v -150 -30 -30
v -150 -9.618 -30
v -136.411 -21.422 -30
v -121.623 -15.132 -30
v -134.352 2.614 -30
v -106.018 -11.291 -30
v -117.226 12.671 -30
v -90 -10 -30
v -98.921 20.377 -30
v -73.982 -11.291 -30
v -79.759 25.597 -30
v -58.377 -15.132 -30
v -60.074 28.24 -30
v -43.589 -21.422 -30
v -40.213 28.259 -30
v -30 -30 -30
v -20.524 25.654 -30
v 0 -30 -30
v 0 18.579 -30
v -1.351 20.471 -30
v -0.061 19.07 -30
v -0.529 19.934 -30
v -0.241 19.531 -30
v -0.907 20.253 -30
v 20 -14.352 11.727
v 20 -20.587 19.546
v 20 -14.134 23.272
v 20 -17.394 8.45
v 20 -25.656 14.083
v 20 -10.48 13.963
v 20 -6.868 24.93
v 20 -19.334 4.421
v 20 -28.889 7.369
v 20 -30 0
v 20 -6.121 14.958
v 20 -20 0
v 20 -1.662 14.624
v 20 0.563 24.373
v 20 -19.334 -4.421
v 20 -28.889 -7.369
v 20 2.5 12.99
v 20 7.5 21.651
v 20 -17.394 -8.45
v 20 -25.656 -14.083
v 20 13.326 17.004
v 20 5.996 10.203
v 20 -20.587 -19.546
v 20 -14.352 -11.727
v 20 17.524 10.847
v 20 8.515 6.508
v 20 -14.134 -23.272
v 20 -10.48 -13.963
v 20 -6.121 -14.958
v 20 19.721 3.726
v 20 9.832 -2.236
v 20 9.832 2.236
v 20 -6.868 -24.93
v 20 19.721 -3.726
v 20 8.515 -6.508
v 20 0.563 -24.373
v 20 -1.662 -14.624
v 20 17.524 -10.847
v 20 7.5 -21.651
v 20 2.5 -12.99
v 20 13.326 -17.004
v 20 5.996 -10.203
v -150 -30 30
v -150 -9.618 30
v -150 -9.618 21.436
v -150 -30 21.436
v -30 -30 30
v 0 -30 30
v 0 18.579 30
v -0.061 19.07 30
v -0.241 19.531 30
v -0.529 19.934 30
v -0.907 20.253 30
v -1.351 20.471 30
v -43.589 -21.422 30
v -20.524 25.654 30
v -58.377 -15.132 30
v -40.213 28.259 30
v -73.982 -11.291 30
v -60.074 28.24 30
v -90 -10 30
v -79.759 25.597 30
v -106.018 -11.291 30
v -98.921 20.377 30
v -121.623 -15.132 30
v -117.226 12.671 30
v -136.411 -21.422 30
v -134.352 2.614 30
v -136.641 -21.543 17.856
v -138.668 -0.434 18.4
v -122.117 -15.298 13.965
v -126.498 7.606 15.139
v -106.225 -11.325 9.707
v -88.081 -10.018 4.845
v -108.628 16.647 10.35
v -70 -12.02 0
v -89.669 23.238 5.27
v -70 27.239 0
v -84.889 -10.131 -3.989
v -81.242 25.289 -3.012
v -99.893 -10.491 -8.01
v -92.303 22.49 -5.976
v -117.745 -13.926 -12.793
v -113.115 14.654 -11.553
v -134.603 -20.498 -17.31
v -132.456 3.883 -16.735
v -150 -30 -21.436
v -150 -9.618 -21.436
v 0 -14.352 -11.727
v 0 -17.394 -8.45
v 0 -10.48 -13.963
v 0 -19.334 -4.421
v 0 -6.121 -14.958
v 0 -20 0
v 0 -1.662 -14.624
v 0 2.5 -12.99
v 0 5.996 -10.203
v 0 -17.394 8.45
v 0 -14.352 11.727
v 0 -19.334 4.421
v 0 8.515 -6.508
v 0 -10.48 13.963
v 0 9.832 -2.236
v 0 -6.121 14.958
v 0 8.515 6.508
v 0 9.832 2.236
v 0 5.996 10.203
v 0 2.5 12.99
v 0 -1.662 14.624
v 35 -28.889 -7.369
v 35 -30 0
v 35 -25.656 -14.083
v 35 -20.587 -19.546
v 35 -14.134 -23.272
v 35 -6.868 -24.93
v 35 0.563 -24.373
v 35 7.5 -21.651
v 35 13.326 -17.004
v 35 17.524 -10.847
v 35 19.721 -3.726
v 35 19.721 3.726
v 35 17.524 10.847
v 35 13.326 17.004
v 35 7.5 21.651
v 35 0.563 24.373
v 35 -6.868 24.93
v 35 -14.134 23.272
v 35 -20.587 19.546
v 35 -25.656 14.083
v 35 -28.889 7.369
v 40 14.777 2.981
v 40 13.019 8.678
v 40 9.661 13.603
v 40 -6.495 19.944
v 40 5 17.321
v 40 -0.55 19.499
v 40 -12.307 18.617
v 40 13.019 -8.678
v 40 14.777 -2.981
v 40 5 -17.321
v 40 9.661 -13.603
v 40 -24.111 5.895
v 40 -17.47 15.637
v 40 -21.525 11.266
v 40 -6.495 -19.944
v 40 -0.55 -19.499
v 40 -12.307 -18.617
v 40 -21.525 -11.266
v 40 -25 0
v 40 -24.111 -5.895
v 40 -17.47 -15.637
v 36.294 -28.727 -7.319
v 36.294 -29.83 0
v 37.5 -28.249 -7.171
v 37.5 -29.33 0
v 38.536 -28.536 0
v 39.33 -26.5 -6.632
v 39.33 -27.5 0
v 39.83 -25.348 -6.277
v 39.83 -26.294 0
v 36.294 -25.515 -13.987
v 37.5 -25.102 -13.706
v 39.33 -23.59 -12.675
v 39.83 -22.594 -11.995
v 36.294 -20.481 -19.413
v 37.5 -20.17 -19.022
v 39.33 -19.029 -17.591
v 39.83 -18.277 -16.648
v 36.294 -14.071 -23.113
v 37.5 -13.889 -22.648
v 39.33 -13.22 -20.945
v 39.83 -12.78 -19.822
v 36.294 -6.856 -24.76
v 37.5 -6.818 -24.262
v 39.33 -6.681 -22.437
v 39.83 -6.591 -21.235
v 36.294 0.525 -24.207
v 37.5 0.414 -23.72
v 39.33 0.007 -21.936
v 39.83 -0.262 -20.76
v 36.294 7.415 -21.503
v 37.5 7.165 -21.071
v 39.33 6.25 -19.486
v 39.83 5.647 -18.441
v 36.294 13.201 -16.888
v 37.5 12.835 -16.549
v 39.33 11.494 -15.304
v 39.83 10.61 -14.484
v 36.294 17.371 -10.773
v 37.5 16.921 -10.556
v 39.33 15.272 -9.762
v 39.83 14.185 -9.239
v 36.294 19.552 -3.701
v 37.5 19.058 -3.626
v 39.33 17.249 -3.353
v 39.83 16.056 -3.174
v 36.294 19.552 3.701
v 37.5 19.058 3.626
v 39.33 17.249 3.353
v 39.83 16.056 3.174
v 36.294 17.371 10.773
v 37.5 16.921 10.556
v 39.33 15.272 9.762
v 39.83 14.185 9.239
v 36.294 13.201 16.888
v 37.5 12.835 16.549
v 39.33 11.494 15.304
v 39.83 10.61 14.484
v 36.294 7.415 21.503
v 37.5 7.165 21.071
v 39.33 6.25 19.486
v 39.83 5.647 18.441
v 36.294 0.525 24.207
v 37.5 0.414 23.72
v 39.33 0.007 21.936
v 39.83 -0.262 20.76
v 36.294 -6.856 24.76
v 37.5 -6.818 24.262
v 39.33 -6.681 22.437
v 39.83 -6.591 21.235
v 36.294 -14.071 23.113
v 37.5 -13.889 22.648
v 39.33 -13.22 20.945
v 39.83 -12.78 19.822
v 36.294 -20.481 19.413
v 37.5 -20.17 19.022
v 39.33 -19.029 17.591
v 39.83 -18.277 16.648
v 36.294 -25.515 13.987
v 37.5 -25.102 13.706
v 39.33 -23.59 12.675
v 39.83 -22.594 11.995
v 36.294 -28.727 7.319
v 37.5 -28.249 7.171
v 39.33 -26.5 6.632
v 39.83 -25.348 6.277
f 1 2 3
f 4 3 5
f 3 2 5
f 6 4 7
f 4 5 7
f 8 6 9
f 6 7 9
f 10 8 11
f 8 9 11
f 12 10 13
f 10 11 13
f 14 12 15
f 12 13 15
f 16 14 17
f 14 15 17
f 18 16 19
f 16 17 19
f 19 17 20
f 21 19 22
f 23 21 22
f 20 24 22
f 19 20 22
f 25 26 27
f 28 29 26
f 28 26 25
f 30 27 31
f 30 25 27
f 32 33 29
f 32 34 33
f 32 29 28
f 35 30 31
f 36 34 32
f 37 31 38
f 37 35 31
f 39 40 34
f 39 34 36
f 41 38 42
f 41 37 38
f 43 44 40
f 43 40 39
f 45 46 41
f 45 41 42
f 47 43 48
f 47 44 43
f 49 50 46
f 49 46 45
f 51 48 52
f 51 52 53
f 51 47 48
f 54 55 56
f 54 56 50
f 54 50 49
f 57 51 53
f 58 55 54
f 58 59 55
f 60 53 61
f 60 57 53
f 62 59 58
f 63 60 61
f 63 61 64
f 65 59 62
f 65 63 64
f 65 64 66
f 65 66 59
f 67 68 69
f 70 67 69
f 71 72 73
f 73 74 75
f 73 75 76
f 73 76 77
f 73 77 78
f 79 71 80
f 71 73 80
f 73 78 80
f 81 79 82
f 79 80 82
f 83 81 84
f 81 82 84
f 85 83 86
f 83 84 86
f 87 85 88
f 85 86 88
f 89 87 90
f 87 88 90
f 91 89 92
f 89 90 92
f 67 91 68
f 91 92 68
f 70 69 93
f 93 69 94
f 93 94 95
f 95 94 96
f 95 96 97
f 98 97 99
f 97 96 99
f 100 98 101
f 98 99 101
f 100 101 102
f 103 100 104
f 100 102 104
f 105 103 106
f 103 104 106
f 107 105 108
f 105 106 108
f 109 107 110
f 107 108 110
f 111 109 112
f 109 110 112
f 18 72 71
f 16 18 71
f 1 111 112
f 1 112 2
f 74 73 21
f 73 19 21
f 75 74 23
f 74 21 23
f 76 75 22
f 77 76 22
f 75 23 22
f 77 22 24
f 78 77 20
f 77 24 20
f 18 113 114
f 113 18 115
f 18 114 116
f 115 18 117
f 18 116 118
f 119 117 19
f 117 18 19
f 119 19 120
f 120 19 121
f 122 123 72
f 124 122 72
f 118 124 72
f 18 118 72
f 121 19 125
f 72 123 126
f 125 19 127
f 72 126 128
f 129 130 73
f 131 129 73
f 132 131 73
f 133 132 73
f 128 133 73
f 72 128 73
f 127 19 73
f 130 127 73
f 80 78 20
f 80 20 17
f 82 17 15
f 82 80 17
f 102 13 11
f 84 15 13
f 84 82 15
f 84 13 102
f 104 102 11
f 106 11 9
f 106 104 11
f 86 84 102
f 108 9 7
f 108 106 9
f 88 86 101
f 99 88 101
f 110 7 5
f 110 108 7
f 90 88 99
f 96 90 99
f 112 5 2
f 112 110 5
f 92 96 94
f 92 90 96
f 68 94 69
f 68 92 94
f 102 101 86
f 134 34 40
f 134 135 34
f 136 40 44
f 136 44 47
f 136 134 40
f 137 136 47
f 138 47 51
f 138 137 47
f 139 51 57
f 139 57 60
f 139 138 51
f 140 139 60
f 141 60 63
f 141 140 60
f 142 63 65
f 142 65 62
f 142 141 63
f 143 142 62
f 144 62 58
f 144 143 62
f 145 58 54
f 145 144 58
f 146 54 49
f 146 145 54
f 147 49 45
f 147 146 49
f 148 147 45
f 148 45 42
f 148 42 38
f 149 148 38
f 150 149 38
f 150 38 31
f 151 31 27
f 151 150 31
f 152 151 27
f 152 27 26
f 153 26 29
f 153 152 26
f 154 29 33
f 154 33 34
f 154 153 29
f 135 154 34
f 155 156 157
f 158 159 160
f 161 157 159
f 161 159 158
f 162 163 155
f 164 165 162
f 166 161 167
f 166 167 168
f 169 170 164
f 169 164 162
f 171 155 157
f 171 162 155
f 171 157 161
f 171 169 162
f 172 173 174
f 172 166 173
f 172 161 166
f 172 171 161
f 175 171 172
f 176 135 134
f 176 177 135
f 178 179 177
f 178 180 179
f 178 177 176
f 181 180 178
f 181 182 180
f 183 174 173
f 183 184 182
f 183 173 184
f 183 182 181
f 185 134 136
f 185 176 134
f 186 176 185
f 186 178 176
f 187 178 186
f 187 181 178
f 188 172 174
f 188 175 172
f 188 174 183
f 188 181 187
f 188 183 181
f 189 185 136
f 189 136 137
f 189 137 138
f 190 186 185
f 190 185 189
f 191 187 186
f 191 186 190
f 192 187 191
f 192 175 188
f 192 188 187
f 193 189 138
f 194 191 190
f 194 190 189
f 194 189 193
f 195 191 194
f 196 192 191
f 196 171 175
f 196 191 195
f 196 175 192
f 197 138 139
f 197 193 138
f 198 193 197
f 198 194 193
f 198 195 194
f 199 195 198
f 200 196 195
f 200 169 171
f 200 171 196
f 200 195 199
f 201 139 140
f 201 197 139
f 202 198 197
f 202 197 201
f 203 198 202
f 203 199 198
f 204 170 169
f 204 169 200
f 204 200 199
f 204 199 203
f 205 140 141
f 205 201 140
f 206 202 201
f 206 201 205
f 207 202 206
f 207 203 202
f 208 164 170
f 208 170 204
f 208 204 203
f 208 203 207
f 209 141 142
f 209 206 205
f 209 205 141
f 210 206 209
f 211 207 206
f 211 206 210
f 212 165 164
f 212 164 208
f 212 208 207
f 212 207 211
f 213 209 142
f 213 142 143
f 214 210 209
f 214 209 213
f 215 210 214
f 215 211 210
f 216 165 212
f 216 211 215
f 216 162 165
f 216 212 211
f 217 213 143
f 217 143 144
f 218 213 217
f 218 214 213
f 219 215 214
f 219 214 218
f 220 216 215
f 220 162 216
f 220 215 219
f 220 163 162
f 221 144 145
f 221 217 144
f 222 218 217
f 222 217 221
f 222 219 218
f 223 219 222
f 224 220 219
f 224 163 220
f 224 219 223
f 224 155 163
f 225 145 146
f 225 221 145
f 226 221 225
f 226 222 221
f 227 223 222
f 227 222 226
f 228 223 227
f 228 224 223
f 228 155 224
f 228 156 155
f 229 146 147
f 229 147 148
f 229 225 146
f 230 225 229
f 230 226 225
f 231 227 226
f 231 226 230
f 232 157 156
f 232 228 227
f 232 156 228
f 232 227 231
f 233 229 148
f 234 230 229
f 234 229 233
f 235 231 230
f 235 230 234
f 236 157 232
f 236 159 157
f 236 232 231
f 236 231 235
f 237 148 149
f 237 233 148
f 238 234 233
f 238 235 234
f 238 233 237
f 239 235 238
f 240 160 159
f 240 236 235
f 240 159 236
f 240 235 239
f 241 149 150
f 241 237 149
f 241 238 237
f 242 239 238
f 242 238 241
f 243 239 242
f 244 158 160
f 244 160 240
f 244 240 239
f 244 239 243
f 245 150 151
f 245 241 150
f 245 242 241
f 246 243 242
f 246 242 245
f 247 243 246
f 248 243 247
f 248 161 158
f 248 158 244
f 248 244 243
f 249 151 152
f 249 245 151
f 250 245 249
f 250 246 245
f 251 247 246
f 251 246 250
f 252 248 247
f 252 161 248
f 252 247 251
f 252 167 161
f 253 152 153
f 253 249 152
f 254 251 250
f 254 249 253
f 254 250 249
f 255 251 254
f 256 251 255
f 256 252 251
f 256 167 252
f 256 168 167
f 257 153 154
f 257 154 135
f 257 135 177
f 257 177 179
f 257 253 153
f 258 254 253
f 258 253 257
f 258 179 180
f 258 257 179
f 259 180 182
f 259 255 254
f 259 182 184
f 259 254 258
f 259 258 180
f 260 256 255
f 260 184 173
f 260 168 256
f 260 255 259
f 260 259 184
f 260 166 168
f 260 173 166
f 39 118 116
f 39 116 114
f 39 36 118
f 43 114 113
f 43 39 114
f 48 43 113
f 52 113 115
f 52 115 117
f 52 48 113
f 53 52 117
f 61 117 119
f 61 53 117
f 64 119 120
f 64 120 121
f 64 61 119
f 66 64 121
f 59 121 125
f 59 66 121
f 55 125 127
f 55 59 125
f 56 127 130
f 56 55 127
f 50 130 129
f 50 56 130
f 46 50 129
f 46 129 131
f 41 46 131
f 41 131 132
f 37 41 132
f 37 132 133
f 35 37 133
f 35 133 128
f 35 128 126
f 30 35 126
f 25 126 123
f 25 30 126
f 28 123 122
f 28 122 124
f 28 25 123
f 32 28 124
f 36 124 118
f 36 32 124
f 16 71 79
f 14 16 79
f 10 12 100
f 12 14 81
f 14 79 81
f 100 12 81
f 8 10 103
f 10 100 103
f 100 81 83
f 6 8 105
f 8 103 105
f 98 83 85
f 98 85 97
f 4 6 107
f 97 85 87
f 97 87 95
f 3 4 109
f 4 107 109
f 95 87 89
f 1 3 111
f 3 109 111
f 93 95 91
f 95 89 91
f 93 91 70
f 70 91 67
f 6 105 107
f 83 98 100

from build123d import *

# Parameters (mm, degrees)
Y_KSEKLIK_EKSTR_ZYON2_DEPTH = 30
KES_EKSTR_ZYON1_REACH       = 62
KES_EKSTR_ZYON2_REACH       = 62
RADYUS1_R                   = 2


with BuildPart() as part:
    # Çizim2 → Yükseklik-Ekstrüzyon2 (new body, symmetric)
    with BuildSketch(Plane(origin=(0, 0, 0), x_dir=(1, 0, 0), z_dir=(0, 1, 0))):
        Polygon((0, 30), (0, -30), (-150, -30), (-150, -21.435935394), (-70, 0), (-150, 21.435935394), (-150, 30), align=None)
    extrude(amount=Y_KSEKLIK_EKSTR_ZYON2_DEPTH, both=True)

    # Çizim3 → Kes-Ekstrüzyon1 (cut, up to next)
    with BuildSketch(Plane.XY.offset(30), mode=Mode.PRIVATE) as kes_ekstr_zyon1_sk1:
        with BuildLine():
            Line((-150, -30), (-30, -30))
            ThreePointArc((-30, -30), (-90, -10), (-150, -30))
        make_face()
    kes_ekstr_zyon1_tool1 = extrude(kes_ekstr_zyon1_sk1.sketch, amount=-KES_EKSTR_ZYON1_REACH, mode=Mode.PRIVATE) & part.part
    add(kes_ekstr_zyon1_tool1.solids().sort_by_distance((-90, -21.927203, 30))[0], mode=Mode.SUBTRACT)

    # Çizim5 → Döndür1 (revolve)
    with BuildSketch(Plane.XY):
        with BuildLine():
            Line((20, -30), (35, -30))
            ThreePointArc((35, -30), (38.535533906, -28.535533906), (40, -25))
            Line((40, -25), (40, -5))
            Line((40, -5), (0, -5))
            Line((0, -5), (0, -20))
            Line((0, -20), (20, -20))
            Line((20, -20), (20, -30))
        make_face()
    revolve(axis=Axis((0, -5, 0), (1, 0, 0)))

    # Çizim6 → Kes-Ekstrüzyon2 (cut, up to next)
    with BuildSketch(Plane.XY.offset(30), mode=Mode.PRIVATE) as kes_ekstr_zyon2_sk1:
        with BuildLine():
            Line((-150, -9.617957362), (-150, 30))
            Line((-150, 30), (0, 30))
            Line((0, 30), (0, 20))
            ThreePointArc((0, 20), (-79.056941504, 25.737381697), (-150, -9.617957362))
        make_face()
    kes_ekstr_zyon2_tool1 = extrude(kes_ekstr_zyon2_sk1.sketch, amount=-KES_EKSTR_ZYON2_REACH, mode=Mode.PRIVATE) & part.part
    add(kes_ekstr_zyon2_tool1.solids().sort_by_distance((-108.440185, 19.830355, 30))[0], mode=Mode.SUBTRACT)

    # Radyus1
    radyus1_edges = [part.edges().sort_by_distance(p)[0] for p in [
        (0, 20, 0),
    ]]
    fillet(radyus1_edges, radius=RADYUS1_R)


solid = part.part
